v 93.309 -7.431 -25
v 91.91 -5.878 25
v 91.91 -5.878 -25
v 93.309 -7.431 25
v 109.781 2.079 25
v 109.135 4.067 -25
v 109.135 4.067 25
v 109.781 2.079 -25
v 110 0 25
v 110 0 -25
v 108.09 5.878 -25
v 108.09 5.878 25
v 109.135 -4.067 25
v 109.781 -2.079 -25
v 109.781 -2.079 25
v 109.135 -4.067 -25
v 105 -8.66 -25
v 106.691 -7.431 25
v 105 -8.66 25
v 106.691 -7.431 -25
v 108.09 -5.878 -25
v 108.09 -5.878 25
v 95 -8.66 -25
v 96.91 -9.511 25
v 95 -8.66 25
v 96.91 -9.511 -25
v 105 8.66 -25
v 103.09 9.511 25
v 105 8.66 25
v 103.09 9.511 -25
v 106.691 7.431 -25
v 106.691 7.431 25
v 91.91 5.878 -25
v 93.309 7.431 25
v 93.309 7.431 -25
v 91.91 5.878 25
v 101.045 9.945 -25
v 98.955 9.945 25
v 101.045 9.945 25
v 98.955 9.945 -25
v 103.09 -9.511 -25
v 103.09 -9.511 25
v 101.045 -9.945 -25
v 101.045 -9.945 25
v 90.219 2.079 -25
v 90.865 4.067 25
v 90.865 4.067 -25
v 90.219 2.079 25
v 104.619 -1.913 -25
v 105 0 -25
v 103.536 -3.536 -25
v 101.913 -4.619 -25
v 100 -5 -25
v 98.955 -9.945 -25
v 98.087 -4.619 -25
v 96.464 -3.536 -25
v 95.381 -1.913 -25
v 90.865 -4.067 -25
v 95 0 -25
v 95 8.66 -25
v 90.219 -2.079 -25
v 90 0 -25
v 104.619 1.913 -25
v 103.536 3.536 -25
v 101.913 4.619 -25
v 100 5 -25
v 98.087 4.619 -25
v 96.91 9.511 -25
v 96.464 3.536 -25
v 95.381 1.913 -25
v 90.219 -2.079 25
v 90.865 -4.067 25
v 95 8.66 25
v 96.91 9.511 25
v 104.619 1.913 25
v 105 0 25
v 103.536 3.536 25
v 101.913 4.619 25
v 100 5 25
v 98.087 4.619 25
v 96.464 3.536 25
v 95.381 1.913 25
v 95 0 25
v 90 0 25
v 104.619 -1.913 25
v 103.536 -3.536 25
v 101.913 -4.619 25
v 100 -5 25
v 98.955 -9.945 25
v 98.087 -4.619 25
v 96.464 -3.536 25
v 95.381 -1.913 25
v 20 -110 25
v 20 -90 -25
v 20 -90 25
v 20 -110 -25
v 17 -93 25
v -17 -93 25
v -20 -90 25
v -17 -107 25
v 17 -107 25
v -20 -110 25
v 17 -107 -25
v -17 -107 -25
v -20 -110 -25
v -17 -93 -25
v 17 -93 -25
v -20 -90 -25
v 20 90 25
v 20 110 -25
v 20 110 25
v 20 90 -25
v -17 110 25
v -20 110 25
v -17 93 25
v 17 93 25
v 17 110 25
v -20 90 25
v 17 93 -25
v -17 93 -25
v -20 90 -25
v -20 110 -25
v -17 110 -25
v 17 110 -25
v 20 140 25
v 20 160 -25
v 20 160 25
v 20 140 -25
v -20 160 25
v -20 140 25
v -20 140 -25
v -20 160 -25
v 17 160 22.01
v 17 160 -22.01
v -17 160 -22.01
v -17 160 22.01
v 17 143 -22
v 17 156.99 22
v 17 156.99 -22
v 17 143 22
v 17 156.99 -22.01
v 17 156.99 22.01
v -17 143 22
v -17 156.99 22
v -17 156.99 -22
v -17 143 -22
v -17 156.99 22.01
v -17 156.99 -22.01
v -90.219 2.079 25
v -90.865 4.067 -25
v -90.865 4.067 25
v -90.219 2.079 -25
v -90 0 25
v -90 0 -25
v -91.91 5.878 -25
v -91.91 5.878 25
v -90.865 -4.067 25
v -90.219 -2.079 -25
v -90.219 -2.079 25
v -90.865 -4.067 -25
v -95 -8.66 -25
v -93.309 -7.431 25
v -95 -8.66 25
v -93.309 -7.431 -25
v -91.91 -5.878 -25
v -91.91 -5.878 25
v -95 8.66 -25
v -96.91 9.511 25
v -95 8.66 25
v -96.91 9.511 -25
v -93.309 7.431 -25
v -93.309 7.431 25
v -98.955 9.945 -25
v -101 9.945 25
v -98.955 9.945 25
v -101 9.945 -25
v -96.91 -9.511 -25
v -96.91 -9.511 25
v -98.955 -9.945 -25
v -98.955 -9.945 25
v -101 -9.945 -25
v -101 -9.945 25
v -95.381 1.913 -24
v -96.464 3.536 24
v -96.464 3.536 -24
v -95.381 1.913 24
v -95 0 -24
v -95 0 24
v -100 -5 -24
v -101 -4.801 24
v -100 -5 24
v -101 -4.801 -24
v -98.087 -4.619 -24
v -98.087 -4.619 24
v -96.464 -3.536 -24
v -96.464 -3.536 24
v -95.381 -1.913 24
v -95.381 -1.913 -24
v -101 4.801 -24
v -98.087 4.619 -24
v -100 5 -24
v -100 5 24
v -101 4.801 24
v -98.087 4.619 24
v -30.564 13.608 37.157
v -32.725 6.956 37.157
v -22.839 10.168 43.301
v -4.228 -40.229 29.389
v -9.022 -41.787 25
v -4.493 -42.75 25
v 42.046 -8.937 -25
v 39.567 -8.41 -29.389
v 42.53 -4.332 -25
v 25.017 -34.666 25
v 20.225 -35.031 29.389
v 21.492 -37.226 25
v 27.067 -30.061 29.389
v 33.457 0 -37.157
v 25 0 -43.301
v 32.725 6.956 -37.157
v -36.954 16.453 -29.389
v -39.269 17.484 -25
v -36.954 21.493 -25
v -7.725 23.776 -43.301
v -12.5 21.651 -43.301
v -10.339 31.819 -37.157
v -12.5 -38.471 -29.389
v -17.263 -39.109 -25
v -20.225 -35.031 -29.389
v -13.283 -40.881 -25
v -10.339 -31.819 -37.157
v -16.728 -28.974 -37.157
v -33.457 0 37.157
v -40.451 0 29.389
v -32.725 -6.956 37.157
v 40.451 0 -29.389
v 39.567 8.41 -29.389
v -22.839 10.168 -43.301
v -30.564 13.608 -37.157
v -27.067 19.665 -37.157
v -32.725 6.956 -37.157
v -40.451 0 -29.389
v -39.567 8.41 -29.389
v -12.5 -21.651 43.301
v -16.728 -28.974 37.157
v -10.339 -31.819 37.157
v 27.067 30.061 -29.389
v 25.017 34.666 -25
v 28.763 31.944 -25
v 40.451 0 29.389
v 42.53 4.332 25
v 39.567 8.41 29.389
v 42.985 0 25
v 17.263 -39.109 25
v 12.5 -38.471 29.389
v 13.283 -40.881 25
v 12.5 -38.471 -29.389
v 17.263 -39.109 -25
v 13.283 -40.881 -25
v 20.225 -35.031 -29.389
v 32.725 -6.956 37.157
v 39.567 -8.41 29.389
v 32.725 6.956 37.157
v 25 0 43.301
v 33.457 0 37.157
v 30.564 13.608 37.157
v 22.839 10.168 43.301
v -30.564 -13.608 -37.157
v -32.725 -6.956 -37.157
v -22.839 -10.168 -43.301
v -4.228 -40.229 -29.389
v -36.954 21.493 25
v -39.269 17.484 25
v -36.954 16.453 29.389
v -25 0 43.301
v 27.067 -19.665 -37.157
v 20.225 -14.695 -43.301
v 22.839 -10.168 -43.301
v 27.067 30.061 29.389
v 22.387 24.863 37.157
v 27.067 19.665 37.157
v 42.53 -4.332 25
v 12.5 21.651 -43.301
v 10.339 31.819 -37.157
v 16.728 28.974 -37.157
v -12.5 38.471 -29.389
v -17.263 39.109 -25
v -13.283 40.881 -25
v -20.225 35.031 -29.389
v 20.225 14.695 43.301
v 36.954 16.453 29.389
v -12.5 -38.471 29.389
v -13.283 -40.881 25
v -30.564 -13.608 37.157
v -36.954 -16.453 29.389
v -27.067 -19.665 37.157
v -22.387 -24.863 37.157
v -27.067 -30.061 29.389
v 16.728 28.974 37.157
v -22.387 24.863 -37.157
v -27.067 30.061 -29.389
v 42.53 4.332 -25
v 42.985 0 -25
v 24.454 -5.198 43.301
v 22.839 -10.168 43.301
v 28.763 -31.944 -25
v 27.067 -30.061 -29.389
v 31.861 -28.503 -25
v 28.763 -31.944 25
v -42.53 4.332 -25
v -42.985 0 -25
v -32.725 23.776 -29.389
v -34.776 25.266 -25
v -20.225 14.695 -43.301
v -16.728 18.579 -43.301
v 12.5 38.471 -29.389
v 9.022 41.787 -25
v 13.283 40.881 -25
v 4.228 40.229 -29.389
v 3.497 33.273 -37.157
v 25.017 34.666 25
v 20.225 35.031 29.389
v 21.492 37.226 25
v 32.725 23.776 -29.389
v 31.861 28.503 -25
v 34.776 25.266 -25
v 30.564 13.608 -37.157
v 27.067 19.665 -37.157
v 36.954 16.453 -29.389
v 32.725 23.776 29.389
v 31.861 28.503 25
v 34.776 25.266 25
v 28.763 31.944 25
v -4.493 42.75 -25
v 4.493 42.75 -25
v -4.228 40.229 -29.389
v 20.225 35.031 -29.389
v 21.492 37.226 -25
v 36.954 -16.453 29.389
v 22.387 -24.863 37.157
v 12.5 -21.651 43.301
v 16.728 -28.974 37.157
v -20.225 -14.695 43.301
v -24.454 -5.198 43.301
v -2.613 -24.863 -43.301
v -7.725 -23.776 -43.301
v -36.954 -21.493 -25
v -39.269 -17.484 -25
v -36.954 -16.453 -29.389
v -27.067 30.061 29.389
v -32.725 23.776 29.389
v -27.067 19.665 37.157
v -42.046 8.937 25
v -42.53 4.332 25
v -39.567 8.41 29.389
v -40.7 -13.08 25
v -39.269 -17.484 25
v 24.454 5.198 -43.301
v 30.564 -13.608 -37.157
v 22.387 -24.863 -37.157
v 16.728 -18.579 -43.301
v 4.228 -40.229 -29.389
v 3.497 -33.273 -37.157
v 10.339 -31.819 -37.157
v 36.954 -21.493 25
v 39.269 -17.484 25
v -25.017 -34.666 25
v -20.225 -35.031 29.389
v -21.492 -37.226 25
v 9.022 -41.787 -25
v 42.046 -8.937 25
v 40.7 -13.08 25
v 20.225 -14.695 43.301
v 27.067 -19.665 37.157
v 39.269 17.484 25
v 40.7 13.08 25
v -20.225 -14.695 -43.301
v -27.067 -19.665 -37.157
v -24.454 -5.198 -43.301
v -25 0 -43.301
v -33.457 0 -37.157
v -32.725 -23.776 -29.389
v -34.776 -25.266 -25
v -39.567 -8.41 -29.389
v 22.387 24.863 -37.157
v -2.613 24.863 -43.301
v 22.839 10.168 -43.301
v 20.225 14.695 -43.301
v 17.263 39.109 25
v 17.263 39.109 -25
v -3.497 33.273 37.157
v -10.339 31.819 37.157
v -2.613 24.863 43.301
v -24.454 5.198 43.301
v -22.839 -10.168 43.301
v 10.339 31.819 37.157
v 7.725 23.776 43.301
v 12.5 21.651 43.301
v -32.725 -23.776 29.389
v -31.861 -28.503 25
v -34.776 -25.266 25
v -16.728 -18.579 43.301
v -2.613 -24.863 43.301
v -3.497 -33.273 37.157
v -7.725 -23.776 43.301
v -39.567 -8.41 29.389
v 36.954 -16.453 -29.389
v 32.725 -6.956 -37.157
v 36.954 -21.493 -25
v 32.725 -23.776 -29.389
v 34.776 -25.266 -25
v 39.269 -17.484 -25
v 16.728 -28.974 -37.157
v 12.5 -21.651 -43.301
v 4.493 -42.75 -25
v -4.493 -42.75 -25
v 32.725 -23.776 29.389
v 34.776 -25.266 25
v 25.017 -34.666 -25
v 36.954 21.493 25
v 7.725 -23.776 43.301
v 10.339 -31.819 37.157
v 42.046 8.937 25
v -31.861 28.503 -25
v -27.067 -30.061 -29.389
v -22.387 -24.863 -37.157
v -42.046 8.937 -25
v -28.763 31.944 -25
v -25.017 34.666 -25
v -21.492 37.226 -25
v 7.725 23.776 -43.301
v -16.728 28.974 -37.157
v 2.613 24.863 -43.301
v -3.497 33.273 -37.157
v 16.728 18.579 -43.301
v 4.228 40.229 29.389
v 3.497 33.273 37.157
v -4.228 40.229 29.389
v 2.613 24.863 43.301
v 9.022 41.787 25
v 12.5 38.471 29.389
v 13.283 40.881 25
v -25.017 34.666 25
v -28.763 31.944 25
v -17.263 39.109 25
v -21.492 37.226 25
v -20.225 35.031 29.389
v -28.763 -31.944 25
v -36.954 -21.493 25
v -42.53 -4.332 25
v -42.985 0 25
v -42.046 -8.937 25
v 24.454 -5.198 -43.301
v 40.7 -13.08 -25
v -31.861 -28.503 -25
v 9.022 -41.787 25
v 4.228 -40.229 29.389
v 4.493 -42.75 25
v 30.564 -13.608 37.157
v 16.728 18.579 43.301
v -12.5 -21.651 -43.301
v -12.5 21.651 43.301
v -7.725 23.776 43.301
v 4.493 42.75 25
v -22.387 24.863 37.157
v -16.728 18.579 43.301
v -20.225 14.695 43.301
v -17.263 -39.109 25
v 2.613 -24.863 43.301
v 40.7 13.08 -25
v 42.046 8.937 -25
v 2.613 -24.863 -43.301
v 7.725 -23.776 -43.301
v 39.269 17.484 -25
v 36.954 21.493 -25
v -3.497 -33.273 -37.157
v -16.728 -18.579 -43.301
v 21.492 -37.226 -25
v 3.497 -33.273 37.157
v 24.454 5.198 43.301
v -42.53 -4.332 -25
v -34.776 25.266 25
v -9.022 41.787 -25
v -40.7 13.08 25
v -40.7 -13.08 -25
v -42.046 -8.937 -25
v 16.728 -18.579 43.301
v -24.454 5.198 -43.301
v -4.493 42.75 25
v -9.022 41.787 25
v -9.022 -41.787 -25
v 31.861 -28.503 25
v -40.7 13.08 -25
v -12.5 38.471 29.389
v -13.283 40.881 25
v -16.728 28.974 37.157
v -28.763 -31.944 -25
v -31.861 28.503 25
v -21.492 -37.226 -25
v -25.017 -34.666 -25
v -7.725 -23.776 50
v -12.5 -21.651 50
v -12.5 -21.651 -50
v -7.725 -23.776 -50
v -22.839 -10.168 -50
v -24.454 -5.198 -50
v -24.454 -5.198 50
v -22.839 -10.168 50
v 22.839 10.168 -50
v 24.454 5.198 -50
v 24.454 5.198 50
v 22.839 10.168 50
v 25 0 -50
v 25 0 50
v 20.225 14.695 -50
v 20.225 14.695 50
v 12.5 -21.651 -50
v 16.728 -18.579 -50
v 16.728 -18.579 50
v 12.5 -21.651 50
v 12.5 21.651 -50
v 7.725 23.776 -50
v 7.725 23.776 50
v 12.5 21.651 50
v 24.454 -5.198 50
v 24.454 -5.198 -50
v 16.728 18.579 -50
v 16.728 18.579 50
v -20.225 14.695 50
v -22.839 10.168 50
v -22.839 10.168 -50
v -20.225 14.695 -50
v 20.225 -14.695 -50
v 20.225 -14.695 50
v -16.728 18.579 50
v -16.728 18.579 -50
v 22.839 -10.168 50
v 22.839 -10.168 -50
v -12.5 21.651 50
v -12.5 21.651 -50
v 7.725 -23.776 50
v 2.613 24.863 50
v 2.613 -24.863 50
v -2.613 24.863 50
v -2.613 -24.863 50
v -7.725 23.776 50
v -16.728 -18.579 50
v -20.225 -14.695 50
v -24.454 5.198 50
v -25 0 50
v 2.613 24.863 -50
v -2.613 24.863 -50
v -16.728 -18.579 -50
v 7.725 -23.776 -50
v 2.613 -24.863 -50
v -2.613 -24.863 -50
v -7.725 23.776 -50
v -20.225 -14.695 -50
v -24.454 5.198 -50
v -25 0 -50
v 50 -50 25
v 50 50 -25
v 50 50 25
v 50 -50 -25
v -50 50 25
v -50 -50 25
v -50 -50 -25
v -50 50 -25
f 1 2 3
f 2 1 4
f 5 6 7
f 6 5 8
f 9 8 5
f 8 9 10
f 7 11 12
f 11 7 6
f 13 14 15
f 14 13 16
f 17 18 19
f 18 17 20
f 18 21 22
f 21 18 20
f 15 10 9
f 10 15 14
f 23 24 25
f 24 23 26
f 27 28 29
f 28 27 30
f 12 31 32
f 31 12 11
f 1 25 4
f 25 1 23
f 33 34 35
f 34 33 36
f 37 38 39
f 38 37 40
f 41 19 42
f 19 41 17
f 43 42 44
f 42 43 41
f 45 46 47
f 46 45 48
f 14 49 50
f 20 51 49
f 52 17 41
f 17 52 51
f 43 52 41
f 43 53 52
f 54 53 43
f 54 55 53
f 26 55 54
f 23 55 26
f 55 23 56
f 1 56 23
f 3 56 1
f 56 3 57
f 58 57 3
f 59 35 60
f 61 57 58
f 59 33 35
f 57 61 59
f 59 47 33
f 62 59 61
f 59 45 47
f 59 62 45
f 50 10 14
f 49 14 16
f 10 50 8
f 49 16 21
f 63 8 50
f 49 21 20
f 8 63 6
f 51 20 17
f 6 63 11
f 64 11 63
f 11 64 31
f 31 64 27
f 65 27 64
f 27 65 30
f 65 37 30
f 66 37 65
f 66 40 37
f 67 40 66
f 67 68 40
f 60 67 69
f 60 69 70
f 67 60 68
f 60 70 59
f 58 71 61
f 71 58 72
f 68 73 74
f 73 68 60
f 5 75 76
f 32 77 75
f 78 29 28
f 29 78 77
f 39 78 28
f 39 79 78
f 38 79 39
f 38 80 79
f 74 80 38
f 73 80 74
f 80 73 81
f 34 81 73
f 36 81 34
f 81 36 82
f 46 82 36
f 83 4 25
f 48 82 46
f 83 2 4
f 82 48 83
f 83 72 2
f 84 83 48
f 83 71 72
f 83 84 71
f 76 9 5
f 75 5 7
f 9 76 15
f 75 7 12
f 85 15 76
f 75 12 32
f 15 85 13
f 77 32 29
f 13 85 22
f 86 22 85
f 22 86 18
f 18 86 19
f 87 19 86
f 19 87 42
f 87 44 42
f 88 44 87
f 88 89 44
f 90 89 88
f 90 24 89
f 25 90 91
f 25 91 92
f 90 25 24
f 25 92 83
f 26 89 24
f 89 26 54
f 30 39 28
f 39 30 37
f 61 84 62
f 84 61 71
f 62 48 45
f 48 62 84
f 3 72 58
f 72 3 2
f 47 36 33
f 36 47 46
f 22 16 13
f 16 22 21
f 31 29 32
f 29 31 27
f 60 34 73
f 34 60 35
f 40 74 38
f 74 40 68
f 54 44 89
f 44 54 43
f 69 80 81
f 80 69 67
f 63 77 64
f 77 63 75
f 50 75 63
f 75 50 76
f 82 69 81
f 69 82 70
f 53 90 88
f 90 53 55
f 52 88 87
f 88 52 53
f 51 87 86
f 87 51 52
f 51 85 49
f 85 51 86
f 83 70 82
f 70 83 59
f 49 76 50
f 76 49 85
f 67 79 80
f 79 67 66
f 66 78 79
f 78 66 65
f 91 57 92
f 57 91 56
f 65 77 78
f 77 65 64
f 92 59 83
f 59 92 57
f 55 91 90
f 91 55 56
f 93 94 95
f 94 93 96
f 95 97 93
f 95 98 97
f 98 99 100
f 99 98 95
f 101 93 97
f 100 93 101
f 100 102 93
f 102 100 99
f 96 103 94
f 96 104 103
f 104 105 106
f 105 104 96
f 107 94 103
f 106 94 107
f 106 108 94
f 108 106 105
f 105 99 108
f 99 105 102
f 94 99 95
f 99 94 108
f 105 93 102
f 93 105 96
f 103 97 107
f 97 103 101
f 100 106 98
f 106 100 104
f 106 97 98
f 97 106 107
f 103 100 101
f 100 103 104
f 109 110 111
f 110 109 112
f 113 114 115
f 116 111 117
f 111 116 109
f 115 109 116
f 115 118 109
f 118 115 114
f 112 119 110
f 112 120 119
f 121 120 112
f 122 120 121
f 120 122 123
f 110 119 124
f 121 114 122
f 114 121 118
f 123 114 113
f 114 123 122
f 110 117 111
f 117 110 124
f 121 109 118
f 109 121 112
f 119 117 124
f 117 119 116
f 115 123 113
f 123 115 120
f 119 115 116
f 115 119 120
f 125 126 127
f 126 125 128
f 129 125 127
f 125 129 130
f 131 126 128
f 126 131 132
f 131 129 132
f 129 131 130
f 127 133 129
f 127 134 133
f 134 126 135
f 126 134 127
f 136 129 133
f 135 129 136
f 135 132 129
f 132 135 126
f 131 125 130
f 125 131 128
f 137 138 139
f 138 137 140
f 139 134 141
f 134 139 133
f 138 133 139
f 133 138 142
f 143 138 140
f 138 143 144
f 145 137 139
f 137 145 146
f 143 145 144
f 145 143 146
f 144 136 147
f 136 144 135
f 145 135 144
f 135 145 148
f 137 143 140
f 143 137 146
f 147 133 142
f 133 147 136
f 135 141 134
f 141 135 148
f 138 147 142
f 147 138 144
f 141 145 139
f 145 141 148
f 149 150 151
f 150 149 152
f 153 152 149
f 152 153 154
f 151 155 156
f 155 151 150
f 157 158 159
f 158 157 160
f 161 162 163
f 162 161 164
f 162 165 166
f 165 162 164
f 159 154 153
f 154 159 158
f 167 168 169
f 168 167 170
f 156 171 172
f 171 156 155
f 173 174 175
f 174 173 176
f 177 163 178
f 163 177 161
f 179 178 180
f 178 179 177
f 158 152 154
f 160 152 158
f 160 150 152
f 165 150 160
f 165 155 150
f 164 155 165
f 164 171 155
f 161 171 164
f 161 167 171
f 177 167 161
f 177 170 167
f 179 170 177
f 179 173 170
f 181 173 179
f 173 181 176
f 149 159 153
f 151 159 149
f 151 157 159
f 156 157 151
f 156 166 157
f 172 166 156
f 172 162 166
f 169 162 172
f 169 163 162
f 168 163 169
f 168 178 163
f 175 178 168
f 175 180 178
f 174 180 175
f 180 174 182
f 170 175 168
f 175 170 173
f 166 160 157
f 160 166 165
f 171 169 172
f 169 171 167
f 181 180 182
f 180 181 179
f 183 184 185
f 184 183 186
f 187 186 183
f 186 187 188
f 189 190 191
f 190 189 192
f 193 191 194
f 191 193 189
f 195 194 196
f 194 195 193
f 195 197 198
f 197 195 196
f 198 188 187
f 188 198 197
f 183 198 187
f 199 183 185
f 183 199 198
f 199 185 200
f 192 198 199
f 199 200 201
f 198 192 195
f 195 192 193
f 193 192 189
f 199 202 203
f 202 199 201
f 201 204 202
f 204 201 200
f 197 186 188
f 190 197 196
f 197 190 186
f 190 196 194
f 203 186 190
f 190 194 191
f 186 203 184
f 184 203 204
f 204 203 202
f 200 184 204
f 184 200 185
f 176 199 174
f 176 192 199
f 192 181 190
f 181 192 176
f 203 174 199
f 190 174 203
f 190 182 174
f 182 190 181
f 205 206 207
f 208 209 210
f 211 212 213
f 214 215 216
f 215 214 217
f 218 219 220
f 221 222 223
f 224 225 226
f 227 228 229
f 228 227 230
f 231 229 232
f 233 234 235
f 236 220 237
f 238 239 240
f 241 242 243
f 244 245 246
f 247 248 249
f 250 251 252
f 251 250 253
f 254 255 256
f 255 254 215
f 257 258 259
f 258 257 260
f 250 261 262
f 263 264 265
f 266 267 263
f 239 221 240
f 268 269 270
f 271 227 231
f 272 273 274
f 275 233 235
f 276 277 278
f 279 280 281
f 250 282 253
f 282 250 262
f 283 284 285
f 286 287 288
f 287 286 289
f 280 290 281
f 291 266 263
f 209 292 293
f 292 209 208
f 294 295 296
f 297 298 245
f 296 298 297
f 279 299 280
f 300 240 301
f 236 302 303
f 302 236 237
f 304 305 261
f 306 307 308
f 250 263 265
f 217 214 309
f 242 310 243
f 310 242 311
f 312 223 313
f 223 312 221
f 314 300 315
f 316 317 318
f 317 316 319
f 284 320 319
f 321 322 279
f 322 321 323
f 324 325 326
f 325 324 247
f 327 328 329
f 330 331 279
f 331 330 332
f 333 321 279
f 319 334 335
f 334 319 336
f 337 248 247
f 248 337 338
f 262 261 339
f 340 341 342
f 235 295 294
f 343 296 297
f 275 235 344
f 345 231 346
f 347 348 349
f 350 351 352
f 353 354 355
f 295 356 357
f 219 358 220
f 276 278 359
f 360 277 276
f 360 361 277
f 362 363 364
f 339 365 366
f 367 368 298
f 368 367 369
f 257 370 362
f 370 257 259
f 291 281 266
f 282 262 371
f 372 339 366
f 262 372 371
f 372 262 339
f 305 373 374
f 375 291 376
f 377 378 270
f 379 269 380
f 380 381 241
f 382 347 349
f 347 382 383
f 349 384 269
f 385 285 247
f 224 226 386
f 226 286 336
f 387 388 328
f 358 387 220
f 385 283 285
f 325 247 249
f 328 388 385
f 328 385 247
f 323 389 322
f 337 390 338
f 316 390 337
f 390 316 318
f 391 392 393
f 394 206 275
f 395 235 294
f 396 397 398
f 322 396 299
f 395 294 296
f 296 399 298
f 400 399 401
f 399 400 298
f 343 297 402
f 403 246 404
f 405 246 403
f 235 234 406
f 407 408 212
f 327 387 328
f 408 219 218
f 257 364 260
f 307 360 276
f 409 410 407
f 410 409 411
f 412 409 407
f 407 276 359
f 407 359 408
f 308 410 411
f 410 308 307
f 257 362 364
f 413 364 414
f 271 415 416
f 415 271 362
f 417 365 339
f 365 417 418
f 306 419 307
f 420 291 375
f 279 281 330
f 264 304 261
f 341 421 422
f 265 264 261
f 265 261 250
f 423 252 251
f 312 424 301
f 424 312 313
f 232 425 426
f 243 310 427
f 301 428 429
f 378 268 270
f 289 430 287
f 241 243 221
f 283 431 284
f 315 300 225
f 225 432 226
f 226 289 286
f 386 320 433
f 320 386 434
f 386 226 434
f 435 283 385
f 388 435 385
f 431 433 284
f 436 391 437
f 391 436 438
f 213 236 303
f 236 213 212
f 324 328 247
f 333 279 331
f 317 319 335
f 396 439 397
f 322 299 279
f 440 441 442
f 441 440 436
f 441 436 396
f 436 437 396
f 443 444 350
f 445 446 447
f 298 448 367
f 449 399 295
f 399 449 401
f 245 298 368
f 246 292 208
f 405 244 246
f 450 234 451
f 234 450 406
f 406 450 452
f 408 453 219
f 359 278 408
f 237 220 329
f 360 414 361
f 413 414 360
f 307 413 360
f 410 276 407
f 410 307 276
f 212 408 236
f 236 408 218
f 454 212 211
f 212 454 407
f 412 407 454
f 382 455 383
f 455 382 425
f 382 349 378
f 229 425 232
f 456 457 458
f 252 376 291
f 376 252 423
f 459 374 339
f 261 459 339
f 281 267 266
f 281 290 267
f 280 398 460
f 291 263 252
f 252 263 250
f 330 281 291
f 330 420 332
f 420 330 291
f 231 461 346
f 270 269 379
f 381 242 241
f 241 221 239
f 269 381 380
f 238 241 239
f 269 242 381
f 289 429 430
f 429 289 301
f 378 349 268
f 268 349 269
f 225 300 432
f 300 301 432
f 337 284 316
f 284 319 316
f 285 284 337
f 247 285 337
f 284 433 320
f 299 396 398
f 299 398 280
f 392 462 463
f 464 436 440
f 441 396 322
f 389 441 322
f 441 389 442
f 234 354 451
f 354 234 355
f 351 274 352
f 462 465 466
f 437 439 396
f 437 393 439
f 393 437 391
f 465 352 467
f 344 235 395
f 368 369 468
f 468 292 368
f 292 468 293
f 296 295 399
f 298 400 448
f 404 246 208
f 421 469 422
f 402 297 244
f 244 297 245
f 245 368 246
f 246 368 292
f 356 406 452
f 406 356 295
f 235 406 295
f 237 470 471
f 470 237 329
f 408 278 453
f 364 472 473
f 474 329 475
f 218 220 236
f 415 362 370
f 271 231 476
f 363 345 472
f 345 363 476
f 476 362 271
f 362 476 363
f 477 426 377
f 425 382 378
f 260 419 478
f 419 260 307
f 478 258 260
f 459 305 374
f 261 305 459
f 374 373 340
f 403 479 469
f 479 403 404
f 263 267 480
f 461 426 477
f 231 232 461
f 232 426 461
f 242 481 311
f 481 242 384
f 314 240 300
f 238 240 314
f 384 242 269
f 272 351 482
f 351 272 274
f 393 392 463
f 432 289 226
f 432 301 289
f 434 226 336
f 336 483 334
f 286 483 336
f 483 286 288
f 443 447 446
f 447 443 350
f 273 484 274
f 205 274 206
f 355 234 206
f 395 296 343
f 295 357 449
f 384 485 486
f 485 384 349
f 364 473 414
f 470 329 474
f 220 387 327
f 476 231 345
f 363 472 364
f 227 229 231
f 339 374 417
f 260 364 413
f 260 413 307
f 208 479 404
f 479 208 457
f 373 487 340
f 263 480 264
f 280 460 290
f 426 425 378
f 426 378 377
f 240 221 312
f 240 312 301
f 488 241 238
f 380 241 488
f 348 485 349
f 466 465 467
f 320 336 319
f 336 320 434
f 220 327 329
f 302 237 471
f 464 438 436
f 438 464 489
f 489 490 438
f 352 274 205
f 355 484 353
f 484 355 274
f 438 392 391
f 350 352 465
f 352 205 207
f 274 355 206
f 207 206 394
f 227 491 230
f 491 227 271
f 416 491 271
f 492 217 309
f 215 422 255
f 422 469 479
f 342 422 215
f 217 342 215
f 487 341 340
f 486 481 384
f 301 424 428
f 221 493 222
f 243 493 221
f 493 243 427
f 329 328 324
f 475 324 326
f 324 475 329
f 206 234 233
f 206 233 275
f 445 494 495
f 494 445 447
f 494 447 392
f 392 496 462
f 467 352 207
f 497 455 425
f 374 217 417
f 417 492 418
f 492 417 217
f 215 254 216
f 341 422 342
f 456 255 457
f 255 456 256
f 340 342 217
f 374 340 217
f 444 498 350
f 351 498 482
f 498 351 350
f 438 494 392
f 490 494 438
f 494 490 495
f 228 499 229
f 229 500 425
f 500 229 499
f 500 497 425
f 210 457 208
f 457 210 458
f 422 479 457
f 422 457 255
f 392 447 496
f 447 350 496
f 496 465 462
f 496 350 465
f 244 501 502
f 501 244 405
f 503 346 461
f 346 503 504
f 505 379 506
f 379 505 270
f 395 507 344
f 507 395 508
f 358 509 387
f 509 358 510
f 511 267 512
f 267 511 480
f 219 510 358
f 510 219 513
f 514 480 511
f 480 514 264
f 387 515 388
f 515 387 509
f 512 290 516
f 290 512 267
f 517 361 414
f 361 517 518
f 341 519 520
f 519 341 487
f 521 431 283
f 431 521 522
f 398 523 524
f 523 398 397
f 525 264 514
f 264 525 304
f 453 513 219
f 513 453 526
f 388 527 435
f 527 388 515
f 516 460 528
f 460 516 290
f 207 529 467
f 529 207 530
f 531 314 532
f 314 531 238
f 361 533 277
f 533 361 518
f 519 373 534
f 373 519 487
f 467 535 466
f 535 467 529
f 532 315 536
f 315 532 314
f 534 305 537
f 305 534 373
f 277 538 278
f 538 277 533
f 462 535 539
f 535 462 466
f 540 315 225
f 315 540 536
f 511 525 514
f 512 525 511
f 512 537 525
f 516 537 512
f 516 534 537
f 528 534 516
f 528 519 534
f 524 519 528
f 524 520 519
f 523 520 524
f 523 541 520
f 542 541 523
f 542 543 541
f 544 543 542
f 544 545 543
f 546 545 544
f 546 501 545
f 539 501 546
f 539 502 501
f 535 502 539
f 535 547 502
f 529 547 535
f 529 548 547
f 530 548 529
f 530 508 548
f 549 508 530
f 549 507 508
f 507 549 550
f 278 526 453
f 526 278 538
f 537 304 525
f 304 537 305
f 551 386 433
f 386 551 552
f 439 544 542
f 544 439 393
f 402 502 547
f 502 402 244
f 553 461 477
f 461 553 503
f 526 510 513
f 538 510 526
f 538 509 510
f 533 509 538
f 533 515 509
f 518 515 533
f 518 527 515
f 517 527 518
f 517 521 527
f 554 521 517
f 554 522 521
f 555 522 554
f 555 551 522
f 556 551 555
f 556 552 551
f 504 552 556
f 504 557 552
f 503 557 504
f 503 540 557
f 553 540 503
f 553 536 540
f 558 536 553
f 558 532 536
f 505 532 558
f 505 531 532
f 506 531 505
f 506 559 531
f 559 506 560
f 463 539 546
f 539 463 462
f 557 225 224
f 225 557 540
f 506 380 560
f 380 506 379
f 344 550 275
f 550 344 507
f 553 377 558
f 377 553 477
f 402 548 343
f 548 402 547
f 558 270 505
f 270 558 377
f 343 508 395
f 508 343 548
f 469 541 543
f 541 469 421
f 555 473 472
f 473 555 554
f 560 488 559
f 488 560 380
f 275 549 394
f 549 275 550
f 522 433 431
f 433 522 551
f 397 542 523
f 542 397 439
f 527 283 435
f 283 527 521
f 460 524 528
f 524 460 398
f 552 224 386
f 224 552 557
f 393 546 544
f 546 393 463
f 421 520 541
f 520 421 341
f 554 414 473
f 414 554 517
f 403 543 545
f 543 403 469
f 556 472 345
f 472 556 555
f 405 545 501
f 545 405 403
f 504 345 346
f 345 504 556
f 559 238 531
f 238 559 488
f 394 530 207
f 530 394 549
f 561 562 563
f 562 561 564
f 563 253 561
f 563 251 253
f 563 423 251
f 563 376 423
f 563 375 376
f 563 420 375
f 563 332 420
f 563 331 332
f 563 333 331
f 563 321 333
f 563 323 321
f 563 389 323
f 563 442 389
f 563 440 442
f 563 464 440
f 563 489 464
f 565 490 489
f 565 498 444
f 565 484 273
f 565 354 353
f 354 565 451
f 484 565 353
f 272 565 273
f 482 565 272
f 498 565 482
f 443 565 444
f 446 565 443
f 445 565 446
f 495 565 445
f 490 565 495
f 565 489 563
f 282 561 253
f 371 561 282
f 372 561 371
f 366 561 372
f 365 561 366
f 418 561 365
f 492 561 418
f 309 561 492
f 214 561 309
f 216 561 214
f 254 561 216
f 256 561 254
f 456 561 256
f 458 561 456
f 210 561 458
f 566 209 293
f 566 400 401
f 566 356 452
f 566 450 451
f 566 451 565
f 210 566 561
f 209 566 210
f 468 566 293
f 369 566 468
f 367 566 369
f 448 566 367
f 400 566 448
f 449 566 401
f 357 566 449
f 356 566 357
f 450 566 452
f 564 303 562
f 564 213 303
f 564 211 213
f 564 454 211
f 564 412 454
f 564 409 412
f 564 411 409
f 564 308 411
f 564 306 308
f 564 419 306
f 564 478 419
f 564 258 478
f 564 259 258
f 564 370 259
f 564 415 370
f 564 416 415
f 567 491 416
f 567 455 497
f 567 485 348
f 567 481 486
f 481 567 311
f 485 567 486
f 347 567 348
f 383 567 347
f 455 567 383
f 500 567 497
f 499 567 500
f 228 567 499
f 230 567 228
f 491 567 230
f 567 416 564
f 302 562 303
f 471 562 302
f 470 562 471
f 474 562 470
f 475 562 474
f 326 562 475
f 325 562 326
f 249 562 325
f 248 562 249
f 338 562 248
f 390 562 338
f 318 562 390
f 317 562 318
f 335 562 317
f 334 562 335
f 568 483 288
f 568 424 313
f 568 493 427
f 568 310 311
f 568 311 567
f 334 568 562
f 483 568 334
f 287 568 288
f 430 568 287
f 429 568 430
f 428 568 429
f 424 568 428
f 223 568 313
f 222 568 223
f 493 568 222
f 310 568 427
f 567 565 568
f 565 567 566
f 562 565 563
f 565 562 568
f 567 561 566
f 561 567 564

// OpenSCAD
// bcstr.scad generic helper modules (2025-04-27)
// comments after modules show up in vscode tooltips
module b(x,y,z){           cube([x,y,z],center=true); }     // block (cube)
module c(height,diameter){ cylinder(h=height, d=diameter, center=true); } // cylinder
module s(diameter){        sphere(d=diameter); }            // sphere
module t(x,y,z){           translate([x,y,z]) children(); } // translate
module r(ax,ay,az){        rotate([ax,ay,az]) children(); } // rotate

// rotating around one axis by 90 degrees is very common
module rx(a=90){ rotate([a,0,0]) children(); }
module ry(a=90){ rotate([0,a,0]) children(); }
module rz(a=90){ rotate([0,0,a]) children(); }


// capped or regular pipe
// cap parameter is the thickness of a cap
module pipe(len, od, id, cap=0){
    inLen = cap ? len-2*cap : len+2;
    difference(){
        c(len, od);
        c(inLen, id);
    }
}


// capped or regular square pipe (tube)
// wall parameter is wall thickness
// cap parameter is the thickness of a cap
module sq_pipe(length, width, height, wall, cap=0){
    h = cap ? height-2*cap : height+2;
    difference(){
        b(length, width, height);
        b(length-2*wall, width-2*wall, h);
    }
}


// this allows you to make C-channels and open boxes
// parameters are the same as for sq_pipe()
module open_sqp(length, width, height, wall, cap=0){
    dt = 0.02; // overlaps for the cutout
    difference() { // opens one wall
        sq_pipe(length, width, height, wall, cap);
        t(0,(width-wall)/2,0) b(length-2*wall,wall+dt,dt+height-2*cap);
    }
}


// tests
color("red") s(100);
c(100,50);
b(100,100,50);
color("grey") t(100,0,0)  pipe(50,20,10);
t(0,-100,0) sq_pipe(40,20,50,3);
color("orange") t(0,100,0) open_sqp(40,20,50,3);
t(0,150,0) open_sqp(40,20,50,3,3);

intersection(){ // capped pipe demo
    t(-100,0,0) pipe(50,20,10,1);
    t(-90,0,0) b(22,22,60); // slice the pipe to show caps
}
